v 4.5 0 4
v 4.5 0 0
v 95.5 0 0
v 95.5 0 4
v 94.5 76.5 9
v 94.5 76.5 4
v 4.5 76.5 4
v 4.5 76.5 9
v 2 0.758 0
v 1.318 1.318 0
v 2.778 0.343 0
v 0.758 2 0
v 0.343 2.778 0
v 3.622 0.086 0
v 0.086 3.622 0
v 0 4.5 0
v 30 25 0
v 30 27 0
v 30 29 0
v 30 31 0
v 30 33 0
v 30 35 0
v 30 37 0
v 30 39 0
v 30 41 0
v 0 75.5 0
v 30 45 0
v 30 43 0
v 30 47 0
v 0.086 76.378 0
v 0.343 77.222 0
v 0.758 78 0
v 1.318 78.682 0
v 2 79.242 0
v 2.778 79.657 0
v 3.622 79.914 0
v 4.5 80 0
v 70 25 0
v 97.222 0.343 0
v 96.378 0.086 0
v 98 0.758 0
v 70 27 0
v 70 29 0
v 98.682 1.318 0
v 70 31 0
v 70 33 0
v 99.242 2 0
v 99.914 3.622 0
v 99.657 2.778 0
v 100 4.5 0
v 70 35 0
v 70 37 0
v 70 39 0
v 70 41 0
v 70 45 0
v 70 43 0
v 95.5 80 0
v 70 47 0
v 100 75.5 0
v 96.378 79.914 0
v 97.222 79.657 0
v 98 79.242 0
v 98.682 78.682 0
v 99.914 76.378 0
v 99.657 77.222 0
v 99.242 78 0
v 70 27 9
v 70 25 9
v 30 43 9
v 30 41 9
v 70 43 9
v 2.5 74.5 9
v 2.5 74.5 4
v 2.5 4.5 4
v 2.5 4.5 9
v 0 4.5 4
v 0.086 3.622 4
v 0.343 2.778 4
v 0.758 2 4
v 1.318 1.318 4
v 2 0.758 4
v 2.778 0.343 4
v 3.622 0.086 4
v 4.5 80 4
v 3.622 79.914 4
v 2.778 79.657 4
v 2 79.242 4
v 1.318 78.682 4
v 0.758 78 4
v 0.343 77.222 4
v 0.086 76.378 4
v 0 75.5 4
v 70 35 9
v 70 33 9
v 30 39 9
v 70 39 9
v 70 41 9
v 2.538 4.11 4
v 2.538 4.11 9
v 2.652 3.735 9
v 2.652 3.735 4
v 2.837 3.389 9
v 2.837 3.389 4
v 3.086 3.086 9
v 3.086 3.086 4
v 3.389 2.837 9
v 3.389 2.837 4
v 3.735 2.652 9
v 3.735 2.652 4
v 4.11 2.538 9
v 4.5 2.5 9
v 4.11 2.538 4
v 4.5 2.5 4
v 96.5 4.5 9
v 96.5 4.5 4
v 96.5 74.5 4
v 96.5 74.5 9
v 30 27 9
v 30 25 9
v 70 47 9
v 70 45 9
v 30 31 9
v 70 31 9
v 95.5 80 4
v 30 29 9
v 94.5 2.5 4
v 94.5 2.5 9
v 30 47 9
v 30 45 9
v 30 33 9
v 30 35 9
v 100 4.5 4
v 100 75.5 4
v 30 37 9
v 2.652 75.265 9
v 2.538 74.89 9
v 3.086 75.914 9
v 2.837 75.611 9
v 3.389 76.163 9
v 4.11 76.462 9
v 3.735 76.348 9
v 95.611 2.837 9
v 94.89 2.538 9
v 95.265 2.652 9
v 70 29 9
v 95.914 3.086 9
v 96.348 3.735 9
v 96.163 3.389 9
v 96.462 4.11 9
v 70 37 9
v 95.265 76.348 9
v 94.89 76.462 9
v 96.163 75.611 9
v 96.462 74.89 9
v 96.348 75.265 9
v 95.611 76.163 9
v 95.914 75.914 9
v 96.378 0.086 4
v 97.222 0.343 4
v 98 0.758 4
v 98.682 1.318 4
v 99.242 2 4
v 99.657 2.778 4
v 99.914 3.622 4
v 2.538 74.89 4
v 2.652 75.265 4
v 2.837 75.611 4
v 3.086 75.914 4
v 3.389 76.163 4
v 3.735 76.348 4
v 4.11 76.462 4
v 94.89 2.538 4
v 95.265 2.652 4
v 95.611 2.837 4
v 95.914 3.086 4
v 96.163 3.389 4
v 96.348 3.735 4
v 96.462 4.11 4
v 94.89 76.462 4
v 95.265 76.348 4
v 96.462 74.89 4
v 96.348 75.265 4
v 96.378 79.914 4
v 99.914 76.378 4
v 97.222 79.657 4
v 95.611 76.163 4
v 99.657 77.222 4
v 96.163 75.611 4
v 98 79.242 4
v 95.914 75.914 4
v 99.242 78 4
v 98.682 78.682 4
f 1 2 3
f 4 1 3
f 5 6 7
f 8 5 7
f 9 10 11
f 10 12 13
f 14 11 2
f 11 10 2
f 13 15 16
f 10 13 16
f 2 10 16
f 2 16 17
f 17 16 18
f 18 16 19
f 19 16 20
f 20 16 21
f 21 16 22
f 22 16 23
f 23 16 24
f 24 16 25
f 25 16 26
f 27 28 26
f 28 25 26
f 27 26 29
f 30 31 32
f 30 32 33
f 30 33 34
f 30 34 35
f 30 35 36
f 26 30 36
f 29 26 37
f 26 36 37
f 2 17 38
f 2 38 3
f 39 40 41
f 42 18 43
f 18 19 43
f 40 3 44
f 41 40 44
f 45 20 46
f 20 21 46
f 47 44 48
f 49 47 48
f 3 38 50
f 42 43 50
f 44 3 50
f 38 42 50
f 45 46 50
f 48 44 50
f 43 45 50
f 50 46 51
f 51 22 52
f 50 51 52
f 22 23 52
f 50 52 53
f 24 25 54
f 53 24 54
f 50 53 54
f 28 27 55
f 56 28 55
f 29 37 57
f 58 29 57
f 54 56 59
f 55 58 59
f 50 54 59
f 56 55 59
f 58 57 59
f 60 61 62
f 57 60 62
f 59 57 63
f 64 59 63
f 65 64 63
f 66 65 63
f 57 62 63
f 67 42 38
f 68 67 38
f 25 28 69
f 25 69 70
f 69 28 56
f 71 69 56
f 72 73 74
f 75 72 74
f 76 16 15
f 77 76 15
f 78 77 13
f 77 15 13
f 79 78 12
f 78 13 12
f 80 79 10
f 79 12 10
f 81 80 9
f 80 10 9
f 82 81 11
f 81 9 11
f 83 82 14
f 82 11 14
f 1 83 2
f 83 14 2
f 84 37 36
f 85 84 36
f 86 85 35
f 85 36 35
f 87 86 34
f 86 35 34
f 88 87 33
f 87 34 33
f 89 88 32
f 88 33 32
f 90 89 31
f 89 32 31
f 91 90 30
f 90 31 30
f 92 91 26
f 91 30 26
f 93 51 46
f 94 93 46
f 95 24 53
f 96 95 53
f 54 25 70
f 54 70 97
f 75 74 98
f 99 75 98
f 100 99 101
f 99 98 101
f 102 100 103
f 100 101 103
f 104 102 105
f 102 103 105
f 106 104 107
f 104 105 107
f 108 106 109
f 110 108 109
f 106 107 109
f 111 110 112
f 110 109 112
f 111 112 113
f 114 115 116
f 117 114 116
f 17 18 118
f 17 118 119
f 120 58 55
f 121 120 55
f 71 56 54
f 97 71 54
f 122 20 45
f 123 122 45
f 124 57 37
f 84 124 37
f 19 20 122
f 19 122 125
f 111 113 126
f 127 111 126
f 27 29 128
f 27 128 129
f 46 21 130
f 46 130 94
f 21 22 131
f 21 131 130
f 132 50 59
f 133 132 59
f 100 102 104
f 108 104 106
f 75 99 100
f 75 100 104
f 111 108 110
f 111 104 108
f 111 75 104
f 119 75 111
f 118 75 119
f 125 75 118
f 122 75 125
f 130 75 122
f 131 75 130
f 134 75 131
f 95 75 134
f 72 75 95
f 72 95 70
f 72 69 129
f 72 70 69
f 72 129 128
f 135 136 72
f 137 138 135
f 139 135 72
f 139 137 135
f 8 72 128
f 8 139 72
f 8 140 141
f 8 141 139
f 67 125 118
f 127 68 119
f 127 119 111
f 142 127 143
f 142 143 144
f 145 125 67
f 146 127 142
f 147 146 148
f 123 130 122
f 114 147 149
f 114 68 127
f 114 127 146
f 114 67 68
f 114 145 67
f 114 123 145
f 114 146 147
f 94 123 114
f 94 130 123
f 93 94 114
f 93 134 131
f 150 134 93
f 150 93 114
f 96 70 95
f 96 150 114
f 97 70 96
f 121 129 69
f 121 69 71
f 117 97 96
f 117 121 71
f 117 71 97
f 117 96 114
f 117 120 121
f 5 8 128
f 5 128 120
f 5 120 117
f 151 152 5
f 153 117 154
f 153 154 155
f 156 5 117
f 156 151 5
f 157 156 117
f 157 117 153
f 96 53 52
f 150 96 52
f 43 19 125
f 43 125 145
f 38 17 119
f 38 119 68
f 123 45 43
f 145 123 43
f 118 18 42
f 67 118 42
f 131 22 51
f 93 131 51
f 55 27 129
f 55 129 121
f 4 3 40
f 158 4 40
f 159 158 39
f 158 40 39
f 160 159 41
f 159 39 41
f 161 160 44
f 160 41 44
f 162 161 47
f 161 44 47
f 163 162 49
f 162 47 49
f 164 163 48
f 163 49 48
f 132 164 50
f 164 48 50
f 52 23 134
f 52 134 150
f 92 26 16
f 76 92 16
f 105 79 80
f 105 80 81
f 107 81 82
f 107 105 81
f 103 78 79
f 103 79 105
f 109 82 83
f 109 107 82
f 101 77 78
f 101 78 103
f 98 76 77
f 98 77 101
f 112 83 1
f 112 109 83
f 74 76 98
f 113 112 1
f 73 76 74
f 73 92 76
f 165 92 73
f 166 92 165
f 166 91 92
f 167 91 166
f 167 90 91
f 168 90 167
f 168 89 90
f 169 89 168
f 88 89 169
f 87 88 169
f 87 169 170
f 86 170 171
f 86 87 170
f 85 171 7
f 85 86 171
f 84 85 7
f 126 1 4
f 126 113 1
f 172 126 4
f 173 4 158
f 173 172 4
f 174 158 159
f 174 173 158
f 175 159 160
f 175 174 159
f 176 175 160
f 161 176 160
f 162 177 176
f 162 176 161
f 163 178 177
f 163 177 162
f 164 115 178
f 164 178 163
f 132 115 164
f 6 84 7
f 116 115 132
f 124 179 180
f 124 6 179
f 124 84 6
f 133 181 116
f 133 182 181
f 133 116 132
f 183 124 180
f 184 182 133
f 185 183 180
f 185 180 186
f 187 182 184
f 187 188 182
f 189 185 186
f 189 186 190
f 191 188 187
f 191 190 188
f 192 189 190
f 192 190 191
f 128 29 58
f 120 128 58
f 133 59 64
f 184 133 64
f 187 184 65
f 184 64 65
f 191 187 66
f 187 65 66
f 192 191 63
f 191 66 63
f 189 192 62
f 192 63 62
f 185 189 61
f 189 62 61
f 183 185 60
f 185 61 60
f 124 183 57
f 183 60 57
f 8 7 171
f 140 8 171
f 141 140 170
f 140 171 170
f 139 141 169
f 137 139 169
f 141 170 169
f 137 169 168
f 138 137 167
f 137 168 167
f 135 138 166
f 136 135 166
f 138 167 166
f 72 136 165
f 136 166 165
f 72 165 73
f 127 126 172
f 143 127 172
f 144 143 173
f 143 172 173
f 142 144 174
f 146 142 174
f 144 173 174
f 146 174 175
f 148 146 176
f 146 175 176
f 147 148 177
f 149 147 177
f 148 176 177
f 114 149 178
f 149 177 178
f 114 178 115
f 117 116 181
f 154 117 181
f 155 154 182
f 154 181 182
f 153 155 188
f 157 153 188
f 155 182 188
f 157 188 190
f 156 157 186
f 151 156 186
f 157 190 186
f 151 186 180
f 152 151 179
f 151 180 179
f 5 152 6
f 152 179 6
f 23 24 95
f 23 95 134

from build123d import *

# Parameters (mm, degrees)
PAD_DEPTH    = 4
PAD001_DEPTH = 5
SKETCH002_W  = 40
SKETCH002_H  = 2
POCKET_DEPTH = 20


with BuildPart() as part:
    # Sketch → Pad (new body)
    with BuildSketch(Plane.XY):
        with BuildLine():
            Line((4.5, 0), (95.5, 0))
            ThreePointArc((95.5, 0), (98.681981, 1.318019), (100, 4.5))
            Line((100, 4.5), (100, 75.5))
            ThreePointArc((100, 75.5), (98.681981, 78.681981), (95.5, 80))
            Line((95.5, 80), (4.5, 80))
            ThreePointArc((4.5, 80), (1.318019, 78.681981), (0, 75.5))
            Line((0, 75.5), (0, 4.5))
            ThreePointArc((0, 4.5), (1.318019, 1.318019), (4.5, 0))
        make_face()
    extrude(amount=PAD_DEPTH)

    # Sketch001 (on Face10 of Pad) → Pad001 (join)
    with BuildSketch(Plane.XY.offset(4)):
        with BuildLine():
            Line((2.5, 74.5), (2.5, 4.5))
            ThreePointArc((2.5, 4.5), (3.085786, 3.085786), (4.5, 2.5))
            Line((4.5, 2.5), (94.5, 2.5))
            ThreePointArc((94.5, 2.5), (95.914214, 3.085786), (96.5, 4.5))
            Line((96.5, 4.5), (96.5, 74.5))
            ThreePointArc((96.5, 74.5), (95.914214, 75.914214), (94.5, 76.5))
            Line((94.5, 76.5), (4.5, 76.5))
            ThreePointArc((4.5, 76.5), (3.085786, 75.914214), (2.5, 74.5))
        make_face()
    extrude(amount=PAD001_DEPTH)

    # Sketch002 (on Face4 of Pad001) → Pocket (cut)
    with BuildSketch(Plane(origin=(0, 0, 0), x_dir=(1, 0, 0), z_dir=(0, 0, -1))):
        with Locations((50, -46)):
            Rectangle(SKETCH002_W, SKETCH002_H)
        with Locations((50, -42)):
            Rectangle(SKETCH002_W, SKETCH002_H)
        with Locations((50, -38)):
            Rectangle(SKETCH002_W, SKETCH002_H)
        with Locations((50, -34)):
            Rectangle(SKETCH002_W, SKETCH002_H)
        with Locations((50, -30)):
            Rectangle(SKETCH002_W, SKETCH002_H)
        with Locations((50, -26)):
            Rectangle(SKETCH002_W, SKETCH002_H)
    extrude(amount=-POCKET_DEPTH, mode=Mode.SUBTRACT)


solid = part.part
